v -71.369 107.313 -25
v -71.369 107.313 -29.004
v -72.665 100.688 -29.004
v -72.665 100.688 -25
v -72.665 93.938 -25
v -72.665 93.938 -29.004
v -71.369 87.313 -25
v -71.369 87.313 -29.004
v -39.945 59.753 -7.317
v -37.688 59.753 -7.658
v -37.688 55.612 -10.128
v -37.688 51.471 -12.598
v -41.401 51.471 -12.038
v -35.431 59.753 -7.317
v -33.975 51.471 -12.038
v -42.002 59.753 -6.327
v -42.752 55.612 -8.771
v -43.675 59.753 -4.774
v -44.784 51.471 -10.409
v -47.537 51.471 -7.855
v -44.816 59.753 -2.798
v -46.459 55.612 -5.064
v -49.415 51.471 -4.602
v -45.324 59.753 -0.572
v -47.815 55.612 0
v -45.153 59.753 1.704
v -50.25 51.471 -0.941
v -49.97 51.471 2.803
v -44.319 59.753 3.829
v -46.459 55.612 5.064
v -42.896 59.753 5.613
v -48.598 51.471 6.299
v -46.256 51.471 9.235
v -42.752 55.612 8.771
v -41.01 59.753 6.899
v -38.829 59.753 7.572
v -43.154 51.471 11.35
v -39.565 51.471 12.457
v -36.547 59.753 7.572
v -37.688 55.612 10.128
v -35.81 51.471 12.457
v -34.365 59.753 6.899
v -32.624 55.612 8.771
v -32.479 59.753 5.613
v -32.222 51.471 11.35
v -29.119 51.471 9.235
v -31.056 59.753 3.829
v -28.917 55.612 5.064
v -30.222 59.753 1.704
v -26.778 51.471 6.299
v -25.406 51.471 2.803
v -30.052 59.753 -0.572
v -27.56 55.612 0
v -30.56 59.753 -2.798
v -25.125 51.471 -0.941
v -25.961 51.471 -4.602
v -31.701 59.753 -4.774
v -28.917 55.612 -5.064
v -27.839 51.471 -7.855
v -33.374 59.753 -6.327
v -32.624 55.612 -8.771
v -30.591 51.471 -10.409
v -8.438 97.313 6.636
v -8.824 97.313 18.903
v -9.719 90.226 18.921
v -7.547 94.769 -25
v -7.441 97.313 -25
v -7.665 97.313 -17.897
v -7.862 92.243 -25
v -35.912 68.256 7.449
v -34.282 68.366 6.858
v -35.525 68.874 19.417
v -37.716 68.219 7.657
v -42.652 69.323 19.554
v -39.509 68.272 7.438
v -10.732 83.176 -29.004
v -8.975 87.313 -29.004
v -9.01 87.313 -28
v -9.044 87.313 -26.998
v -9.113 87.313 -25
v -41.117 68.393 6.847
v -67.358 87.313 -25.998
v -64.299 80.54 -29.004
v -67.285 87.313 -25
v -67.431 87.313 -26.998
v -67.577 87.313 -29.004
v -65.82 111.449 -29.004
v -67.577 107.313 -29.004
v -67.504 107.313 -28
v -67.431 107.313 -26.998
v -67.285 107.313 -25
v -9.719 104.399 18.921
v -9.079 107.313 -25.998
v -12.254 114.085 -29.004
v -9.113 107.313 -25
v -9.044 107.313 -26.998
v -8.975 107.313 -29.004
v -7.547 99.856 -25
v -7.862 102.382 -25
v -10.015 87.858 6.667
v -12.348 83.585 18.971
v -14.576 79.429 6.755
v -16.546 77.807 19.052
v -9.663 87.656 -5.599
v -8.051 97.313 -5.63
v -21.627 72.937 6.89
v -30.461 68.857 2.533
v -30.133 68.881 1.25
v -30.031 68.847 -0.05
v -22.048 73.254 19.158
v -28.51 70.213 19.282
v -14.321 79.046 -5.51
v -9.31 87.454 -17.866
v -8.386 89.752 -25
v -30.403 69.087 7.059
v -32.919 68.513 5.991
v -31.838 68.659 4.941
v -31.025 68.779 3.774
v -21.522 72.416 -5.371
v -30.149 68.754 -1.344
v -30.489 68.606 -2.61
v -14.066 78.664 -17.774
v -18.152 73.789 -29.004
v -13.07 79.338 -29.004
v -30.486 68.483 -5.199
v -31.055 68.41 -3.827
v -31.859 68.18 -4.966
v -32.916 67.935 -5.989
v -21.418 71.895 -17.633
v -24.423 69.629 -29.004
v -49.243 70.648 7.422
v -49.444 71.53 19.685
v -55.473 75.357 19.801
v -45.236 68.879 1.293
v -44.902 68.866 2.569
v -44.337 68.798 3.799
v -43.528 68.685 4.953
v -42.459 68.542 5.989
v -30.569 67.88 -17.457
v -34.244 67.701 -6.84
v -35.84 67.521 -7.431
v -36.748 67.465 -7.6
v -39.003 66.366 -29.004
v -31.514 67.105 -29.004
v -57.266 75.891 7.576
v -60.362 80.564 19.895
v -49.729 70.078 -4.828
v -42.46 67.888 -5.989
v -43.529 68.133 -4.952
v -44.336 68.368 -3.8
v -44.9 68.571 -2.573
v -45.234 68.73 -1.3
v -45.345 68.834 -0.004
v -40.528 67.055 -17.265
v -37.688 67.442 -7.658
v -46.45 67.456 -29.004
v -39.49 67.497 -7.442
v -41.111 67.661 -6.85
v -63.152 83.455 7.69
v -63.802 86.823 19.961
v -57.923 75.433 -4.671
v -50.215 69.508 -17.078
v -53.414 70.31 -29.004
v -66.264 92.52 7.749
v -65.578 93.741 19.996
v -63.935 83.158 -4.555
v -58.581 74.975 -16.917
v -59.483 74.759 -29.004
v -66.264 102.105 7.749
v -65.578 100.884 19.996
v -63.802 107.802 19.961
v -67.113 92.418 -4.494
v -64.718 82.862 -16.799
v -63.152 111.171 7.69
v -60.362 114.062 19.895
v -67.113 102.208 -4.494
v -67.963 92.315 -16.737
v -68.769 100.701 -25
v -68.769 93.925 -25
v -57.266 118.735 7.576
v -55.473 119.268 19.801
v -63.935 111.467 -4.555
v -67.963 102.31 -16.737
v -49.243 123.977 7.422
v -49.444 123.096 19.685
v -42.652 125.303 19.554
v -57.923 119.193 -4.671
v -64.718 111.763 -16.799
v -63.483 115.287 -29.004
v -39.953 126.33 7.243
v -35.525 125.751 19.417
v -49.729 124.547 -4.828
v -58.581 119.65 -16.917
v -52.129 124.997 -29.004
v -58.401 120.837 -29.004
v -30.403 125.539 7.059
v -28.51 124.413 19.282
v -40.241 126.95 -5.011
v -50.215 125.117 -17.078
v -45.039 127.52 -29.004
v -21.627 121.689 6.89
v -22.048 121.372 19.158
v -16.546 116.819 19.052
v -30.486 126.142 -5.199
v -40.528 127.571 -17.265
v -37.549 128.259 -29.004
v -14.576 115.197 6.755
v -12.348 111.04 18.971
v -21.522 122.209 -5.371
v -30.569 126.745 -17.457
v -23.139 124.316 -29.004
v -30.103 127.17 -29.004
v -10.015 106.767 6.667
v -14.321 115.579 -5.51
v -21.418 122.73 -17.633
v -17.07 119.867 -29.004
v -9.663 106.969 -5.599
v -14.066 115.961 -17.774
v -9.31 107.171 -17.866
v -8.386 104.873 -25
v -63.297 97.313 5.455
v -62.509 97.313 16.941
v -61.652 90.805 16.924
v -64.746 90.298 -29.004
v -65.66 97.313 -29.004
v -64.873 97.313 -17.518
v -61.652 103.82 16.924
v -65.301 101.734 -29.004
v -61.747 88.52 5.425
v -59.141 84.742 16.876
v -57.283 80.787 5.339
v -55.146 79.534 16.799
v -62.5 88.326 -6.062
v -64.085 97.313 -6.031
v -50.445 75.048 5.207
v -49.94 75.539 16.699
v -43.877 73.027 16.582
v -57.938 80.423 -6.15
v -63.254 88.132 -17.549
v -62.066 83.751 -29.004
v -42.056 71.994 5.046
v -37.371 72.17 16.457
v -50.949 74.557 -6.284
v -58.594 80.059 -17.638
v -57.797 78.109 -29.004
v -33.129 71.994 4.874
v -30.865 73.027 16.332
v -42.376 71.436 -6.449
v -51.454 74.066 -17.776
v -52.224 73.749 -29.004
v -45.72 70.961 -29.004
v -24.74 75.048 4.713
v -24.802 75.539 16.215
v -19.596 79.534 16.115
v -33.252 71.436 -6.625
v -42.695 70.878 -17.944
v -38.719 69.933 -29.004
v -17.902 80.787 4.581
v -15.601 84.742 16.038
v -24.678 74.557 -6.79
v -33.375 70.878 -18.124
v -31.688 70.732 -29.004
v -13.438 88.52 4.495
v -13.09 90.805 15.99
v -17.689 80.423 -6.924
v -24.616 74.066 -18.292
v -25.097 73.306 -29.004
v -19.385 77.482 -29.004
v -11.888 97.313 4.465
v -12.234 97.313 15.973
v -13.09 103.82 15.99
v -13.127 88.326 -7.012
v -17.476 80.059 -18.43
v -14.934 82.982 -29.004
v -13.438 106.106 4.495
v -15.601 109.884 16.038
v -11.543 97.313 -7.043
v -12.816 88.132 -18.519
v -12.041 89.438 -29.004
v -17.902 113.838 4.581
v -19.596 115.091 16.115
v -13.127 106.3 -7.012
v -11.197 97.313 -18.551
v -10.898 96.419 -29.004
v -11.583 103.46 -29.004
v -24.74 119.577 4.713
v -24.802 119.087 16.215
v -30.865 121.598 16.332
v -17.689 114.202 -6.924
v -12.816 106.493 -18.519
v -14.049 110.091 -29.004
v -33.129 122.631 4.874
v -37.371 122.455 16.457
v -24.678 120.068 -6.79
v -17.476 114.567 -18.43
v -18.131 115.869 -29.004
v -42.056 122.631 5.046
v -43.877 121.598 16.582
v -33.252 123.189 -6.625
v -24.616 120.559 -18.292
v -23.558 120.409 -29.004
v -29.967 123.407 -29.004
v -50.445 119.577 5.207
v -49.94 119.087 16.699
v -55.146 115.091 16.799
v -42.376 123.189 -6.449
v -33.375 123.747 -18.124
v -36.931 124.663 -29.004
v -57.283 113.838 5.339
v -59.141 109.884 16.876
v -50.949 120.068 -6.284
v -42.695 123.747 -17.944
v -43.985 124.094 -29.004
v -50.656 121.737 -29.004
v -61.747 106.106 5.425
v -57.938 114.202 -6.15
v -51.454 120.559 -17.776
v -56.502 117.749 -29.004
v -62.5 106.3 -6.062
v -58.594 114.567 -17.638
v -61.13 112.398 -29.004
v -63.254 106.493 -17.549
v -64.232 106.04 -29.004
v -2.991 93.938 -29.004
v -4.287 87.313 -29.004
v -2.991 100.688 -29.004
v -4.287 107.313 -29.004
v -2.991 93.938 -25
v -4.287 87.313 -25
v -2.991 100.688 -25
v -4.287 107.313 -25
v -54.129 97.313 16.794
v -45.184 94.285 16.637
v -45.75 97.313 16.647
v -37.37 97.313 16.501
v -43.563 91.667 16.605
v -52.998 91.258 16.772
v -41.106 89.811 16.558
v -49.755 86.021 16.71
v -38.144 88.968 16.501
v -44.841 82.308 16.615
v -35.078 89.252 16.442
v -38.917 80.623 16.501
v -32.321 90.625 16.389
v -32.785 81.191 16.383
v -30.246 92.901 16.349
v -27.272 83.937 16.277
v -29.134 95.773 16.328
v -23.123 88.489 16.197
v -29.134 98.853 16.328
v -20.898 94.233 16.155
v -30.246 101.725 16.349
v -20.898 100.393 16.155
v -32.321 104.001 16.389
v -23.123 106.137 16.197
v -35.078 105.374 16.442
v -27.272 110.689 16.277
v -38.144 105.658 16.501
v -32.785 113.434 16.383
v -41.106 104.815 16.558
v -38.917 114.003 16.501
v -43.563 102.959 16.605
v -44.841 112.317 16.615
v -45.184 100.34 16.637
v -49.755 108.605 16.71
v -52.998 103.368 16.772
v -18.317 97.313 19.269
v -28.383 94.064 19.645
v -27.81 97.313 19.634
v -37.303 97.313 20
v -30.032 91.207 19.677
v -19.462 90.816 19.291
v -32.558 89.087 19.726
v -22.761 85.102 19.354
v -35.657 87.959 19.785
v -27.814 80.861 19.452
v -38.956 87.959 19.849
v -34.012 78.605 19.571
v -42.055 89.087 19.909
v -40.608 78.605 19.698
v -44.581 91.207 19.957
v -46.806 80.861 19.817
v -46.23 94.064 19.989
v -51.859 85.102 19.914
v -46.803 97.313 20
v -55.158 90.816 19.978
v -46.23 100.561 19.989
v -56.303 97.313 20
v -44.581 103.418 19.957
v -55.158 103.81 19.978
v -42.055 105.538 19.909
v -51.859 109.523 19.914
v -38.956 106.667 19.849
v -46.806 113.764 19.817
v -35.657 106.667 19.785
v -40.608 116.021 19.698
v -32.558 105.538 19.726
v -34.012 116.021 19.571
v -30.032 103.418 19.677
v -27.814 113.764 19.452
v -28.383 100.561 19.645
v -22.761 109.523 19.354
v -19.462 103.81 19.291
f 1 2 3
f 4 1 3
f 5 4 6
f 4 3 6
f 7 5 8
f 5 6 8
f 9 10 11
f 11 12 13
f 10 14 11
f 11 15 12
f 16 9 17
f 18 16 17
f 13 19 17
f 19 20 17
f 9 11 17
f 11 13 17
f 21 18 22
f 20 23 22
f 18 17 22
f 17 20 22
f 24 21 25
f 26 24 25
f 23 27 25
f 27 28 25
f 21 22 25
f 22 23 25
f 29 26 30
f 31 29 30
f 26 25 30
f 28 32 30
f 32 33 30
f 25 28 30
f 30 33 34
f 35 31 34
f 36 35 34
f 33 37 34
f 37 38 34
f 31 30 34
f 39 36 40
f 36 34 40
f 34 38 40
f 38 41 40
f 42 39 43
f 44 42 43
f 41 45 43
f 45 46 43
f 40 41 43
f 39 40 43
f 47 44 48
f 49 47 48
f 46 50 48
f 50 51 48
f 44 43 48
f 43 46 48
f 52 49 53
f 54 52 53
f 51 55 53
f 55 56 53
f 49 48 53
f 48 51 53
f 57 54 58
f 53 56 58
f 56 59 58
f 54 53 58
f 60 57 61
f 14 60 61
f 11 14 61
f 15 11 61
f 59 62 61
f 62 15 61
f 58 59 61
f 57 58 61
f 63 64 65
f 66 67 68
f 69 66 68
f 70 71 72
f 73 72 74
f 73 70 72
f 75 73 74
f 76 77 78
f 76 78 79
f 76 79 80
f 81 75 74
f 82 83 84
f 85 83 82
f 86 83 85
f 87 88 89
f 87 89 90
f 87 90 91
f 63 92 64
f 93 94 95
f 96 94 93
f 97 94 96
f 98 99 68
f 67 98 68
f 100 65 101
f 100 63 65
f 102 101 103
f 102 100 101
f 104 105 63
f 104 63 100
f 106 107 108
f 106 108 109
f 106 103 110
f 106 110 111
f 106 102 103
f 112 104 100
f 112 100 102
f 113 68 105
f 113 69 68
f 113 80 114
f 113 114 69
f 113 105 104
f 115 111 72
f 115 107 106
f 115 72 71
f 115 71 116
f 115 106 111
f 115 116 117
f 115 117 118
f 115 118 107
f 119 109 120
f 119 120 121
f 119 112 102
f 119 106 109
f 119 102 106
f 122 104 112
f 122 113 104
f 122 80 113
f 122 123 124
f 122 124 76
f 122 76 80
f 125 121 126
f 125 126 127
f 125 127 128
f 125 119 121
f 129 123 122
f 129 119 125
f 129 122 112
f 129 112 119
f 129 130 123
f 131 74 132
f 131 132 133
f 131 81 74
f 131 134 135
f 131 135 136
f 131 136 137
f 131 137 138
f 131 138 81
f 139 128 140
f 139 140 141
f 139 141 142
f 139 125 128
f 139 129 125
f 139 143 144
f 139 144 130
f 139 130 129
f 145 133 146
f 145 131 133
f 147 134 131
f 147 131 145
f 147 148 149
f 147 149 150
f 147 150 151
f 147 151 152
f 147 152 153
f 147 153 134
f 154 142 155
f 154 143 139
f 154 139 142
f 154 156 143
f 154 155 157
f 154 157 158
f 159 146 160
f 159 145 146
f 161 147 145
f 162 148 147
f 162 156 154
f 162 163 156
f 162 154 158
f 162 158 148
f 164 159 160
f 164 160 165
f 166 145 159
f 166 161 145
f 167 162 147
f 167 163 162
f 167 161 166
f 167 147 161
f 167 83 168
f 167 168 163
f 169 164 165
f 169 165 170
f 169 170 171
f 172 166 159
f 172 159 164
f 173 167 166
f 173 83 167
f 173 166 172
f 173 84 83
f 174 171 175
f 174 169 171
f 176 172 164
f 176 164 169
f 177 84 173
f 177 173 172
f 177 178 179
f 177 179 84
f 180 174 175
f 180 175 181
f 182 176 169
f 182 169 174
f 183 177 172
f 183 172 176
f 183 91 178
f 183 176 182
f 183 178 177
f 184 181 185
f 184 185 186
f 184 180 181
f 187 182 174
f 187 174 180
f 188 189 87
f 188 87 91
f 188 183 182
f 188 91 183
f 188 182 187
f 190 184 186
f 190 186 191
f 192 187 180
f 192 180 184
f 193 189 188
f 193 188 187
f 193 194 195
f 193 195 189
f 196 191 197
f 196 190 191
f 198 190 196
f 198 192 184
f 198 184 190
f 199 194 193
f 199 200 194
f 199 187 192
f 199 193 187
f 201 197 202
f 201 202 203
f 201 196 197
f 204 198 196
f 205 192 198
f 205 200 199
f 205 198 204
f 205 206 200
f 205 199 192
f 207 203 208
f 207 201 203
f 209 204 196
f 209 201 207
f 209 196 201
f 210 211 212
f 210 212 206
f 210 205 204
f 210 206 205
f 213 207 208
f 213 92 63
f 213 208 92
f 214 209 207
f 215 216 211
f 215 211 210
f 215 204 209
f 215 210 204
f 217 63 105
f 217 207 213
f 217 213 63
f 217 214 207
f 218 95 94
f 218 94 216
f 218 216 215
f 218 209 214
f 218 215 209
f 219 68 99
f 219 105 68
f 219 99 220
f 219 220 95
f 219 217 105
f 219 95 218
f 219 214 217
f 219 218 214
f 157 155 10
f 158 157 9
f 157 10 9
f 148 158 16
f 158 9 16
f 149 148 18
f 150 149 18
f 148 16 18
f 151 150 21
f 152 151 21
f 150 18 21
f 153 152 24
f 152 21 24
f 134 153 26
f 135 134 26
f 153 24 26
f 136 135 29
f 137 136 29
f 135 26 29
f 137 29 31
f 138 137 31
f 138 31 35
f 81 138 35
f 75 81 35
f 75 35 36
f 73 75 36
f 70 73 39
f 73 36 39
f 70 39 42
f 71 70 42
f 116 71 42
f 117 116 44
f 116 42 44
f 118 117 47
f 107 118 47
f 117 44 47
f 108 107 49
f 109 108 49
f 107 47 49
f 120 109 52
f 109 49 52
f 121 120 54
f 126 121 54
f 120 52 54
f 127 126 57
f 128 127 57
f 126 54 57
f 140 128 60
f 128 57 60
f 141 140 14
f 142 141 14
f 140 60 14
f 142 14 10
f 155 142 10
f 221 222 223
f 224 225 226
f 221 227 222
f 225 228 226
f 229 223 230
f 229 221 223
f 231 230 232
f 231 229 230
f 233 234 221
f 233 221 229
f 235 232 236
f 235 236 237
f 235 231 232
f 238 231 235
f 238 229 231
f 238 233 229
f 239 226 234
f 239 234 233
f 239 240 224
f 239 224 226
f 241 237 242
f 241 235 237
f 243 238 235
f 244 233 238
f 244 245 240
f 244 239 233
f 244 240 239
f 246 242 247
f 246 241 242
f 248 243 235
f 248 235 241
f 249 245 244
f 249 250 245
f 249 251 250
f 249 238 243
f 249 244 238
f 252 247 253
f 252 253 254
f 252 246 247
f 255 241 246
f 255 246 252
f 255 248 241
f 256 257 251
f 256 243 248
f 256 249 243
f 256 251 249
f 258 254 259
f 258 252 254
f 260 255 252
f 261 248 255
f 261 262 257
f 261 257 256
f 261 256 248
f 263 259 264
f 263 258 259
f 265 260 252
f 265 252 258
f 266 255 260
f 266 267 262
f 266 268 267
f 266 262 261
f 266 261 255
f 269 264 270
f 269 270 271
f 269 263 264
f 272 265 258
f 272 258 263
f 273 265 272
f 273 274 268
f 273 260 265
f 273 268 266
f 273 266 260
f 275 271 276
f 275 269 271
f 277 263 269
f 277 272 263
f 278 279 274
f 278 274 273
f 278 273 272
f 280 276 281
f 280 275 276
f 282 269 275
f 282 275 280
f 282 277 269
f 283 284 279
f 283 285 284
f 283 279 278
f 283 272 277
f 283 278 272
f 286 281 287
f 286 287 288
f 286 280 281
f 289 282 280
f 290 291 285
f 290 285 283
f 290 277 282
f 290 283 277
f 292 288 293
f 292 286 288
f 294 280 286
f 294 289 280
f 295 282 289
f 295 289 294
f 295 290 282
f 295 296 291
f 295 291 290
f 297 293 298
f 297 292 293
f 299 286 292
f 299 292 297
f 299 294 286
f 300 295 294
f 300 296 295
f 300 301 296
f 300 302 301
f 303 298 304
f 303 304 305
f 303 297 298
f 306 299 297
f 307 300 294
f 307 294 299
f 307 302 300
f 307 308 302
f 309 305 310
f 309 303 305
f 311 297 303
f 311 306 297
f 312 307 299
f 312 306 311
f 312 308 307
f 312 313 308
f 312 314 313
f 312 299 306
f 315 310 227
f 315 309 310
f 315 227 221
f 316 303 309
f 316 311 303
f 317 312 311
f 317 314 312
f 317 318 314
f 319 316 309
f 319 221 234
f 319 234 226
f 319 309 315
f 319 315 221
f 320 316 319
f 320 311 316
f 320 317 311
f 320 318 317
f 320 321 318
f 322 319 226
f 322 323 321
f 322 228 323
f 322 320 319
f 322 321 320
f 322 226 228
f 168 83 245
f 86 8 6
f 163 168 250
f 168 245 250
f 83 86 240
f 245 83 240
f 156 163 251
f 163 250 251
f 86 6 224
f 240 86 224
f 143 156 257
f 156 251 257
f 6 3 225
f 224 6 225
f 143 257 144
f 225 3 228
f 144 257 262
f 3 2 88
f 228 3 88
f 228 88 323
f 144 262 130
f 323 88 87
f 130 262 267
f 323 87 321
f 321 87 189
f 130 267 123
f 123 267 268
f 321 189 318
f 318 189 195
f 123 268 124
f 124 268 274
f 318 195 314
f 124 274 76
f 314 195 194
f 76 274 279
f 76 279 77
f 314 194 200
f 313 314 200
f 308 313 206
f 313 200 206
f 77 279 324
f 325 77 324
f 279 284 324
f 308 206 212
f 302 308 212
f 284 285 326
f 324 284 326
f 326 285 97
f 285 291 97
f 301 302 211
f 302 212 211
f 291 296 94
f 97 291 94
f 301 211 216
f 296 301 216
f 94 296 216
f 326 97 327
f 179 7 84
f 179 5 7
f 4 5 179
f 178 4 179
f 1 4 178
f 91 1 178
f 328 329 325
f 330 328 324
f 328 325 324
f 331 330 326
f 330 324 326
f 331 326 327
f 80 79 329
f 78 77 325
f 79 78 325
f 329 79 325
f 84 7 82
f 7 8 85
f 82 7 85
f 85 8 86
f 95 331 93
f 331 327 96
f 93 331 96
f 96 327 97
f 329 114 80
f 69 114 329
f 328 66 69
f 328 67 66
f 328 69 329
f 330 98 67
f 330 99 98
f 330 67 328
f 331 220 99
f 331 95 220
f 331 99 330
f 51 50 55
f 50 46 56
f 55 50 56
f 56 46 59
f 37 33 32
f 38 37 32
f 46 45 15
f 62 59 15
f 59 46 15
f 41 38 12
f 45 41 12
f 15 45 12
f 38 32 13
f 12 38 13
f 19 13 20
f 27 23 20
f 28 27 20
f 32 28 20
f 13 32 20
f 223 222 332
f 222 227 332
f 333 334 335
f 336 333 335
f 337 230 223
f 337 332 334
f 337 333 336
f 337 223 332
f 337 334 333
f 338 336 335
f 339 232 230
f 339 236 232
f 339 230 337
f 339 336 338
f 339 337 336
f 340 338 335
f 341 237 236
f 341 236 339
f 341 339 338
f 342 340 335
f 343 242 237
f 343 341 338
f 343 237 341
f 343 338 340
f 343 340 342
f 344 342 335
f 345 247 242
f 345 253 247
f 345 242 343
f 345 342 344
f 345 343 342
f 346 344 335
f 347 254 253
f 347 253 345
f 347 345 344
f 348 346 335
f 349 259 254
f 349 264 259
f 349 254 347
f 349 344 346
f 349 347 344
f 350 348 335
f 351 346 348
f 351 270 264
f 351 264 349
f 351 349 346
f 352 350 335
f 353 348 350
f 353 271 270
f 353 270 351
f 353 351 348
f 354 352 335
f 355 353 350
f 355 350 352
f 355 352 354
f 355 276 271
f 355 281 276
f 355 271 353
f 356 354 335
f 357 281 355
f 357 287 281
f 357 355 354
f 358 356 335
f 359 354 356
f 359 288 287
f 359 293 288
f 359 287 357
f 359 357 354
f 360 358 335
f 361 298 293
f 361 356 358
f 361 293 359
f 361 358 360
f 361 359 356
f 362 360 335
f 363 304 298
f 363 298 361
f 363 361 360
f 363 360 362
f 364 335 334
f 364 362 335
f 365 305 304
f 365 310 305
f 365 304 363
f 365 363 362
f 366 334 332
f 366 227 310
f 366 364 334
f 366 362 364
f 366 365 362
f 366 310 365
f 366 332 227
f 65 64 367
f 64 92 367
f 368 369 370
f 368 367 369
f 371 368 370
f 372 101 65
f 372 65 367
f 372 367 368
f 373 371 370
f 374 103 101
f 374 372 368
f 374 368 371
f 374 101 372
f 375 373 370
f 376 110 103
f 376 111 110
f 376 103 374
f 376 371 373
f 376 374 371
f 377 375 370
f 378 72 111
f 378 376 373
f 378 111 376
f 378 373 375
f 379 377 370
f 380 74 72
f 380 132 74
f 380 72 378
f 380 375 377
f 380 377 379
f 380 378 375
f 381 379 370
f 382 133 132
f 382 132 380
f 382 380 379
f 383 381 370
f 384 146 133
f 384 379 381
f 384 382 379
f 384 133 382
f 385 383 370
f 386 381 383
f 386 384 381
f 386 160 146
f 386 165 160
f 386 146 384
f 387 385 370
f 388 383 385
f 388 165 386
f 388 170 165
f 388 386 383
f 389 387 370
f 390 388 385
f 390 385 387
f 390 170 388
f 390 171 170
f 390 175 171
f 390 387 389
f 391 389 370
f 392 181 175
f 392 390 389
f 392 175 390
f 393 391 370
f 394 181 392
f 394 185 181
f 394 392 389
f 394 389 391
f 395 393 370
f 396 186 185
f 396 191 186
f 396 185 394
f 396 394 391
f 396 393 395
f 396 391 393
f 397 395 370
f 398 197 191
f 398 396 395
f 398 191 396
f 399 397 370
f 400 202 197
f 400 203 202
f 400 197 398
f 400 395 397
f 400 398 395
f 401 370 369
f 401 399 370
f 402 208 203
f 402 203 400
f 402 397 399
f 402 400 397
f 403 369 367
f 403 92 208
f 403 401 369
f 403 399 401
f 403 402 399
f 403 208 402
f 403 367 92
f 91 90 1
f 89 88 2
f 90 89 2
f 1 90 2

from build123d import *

# Parameters (mm, degrees)
BOSS_EXTRUDE9_DEPTH = 5
SKETCH10_W          = 100.017630752
SKETCH10_H          = 82.257490713
CUT_EXTRUDE5_DEPTH  = 5


with BuildPart() as part:
    # Sketch3 → Revolve4 (revolve)
    with BuildSketch(Plane.XY):
        Polygon((-45.345396491, 59.752657492), (-50.285549319, 51.471259135), (-37.687875269, 51.471259135), (-37.687875269, 71.31273478), (-45.345396491, 71.31273478), align=None)
    revolve(axis=Axis((-37.687875269, 51.471259135, 0), (0, 1, 0)))

    # Sketch5 → Revolve5 (revolve)
    with BuildSketch(Plane(origin=(0, 97.31273478, 0), x_dir=(1, 0, 0), z_dir=(0, 1, 0))):
        Polygon((-37.687875269, 0), (-37.302956611, -20), (-65.802956611, -20), (-69.265253256, 29.40337608), (-38.265253256, 30), align=None)
    revolve(axis=Axis((-37.687875269, 97.31273478, 0), (-0.01924236949216868, 0, -0.9998148484676185)))

    # Sketch9 → Boss-Extrude9 (add)
    with BuildSketch(Plane.XY.offset(-25)):
        with BuildLine():
            Line((-9.761081063, 87.31273478), (-4.286962272, 87.31273478))
            ThreePointArc((-4.286962272, 87.31273478), (-2.827981935, 97.31273478), (-4.286962272, 107.31273478))
            Line((-4.286962272, 107.31273478), (-9.761081063, 107.31273478))
            Line((-9.761081063, 107.31273478), (-9.761081063, 87.31273478))
        make_face()
        with BuildLine():
            ThreePointArc((-66.708431797, 87.31273478), (-68.390710613, 97.31273478), (-66.708431797, 107.31273478))
            Line((-66.708431797, 107.31273478), (-71.369001597, 107.31273478))
            ThreePointArc((-71.369001597, 107.31273478), (-72.827981935, 97.31273478), (-71.369001597, 87.31273478))
            Line((-71.369001597, 87.31273478), (-66.708431797, 87.31273478))
        make_face()
    extrude(amount=-BOSS_EXTRUDE9_DEPTH)

    # Sketch10 → Cut-Extrude5 (cut)
    with BuildSketch(Plane.XY.offset(-29.00378798)):
        with Locations((-35.882792004, 102.435950212)):
            Rectangle(SKETCH10_W, SKETCH10_H)
    extrude(amount=-CUT_EXTRUDE5_DEPTH, mode=Mode.SUBTRACT)

    # Sketch6 → Cut-Revolve4 (revolve, cut)
    with BuildSketch(Plane(origin=(0, 97.31273478, 0), x_dir=(1, 0, 0), z_dir=(0, 1, 0))):
        Polygon((-37.370304904, -16.50064803), (-62.508760096, -16.940904481), (-65.765253256, 30.531390366), (-38.285658965, 31.060260794), align=None)
    revolve(axis=Axis((-38.285658965, 97.31273478, -31.060260794), (0.019242369492168804, 0, 0.9998148484676185)), mode=Mode.SUBTRACT)


solid = part.part
